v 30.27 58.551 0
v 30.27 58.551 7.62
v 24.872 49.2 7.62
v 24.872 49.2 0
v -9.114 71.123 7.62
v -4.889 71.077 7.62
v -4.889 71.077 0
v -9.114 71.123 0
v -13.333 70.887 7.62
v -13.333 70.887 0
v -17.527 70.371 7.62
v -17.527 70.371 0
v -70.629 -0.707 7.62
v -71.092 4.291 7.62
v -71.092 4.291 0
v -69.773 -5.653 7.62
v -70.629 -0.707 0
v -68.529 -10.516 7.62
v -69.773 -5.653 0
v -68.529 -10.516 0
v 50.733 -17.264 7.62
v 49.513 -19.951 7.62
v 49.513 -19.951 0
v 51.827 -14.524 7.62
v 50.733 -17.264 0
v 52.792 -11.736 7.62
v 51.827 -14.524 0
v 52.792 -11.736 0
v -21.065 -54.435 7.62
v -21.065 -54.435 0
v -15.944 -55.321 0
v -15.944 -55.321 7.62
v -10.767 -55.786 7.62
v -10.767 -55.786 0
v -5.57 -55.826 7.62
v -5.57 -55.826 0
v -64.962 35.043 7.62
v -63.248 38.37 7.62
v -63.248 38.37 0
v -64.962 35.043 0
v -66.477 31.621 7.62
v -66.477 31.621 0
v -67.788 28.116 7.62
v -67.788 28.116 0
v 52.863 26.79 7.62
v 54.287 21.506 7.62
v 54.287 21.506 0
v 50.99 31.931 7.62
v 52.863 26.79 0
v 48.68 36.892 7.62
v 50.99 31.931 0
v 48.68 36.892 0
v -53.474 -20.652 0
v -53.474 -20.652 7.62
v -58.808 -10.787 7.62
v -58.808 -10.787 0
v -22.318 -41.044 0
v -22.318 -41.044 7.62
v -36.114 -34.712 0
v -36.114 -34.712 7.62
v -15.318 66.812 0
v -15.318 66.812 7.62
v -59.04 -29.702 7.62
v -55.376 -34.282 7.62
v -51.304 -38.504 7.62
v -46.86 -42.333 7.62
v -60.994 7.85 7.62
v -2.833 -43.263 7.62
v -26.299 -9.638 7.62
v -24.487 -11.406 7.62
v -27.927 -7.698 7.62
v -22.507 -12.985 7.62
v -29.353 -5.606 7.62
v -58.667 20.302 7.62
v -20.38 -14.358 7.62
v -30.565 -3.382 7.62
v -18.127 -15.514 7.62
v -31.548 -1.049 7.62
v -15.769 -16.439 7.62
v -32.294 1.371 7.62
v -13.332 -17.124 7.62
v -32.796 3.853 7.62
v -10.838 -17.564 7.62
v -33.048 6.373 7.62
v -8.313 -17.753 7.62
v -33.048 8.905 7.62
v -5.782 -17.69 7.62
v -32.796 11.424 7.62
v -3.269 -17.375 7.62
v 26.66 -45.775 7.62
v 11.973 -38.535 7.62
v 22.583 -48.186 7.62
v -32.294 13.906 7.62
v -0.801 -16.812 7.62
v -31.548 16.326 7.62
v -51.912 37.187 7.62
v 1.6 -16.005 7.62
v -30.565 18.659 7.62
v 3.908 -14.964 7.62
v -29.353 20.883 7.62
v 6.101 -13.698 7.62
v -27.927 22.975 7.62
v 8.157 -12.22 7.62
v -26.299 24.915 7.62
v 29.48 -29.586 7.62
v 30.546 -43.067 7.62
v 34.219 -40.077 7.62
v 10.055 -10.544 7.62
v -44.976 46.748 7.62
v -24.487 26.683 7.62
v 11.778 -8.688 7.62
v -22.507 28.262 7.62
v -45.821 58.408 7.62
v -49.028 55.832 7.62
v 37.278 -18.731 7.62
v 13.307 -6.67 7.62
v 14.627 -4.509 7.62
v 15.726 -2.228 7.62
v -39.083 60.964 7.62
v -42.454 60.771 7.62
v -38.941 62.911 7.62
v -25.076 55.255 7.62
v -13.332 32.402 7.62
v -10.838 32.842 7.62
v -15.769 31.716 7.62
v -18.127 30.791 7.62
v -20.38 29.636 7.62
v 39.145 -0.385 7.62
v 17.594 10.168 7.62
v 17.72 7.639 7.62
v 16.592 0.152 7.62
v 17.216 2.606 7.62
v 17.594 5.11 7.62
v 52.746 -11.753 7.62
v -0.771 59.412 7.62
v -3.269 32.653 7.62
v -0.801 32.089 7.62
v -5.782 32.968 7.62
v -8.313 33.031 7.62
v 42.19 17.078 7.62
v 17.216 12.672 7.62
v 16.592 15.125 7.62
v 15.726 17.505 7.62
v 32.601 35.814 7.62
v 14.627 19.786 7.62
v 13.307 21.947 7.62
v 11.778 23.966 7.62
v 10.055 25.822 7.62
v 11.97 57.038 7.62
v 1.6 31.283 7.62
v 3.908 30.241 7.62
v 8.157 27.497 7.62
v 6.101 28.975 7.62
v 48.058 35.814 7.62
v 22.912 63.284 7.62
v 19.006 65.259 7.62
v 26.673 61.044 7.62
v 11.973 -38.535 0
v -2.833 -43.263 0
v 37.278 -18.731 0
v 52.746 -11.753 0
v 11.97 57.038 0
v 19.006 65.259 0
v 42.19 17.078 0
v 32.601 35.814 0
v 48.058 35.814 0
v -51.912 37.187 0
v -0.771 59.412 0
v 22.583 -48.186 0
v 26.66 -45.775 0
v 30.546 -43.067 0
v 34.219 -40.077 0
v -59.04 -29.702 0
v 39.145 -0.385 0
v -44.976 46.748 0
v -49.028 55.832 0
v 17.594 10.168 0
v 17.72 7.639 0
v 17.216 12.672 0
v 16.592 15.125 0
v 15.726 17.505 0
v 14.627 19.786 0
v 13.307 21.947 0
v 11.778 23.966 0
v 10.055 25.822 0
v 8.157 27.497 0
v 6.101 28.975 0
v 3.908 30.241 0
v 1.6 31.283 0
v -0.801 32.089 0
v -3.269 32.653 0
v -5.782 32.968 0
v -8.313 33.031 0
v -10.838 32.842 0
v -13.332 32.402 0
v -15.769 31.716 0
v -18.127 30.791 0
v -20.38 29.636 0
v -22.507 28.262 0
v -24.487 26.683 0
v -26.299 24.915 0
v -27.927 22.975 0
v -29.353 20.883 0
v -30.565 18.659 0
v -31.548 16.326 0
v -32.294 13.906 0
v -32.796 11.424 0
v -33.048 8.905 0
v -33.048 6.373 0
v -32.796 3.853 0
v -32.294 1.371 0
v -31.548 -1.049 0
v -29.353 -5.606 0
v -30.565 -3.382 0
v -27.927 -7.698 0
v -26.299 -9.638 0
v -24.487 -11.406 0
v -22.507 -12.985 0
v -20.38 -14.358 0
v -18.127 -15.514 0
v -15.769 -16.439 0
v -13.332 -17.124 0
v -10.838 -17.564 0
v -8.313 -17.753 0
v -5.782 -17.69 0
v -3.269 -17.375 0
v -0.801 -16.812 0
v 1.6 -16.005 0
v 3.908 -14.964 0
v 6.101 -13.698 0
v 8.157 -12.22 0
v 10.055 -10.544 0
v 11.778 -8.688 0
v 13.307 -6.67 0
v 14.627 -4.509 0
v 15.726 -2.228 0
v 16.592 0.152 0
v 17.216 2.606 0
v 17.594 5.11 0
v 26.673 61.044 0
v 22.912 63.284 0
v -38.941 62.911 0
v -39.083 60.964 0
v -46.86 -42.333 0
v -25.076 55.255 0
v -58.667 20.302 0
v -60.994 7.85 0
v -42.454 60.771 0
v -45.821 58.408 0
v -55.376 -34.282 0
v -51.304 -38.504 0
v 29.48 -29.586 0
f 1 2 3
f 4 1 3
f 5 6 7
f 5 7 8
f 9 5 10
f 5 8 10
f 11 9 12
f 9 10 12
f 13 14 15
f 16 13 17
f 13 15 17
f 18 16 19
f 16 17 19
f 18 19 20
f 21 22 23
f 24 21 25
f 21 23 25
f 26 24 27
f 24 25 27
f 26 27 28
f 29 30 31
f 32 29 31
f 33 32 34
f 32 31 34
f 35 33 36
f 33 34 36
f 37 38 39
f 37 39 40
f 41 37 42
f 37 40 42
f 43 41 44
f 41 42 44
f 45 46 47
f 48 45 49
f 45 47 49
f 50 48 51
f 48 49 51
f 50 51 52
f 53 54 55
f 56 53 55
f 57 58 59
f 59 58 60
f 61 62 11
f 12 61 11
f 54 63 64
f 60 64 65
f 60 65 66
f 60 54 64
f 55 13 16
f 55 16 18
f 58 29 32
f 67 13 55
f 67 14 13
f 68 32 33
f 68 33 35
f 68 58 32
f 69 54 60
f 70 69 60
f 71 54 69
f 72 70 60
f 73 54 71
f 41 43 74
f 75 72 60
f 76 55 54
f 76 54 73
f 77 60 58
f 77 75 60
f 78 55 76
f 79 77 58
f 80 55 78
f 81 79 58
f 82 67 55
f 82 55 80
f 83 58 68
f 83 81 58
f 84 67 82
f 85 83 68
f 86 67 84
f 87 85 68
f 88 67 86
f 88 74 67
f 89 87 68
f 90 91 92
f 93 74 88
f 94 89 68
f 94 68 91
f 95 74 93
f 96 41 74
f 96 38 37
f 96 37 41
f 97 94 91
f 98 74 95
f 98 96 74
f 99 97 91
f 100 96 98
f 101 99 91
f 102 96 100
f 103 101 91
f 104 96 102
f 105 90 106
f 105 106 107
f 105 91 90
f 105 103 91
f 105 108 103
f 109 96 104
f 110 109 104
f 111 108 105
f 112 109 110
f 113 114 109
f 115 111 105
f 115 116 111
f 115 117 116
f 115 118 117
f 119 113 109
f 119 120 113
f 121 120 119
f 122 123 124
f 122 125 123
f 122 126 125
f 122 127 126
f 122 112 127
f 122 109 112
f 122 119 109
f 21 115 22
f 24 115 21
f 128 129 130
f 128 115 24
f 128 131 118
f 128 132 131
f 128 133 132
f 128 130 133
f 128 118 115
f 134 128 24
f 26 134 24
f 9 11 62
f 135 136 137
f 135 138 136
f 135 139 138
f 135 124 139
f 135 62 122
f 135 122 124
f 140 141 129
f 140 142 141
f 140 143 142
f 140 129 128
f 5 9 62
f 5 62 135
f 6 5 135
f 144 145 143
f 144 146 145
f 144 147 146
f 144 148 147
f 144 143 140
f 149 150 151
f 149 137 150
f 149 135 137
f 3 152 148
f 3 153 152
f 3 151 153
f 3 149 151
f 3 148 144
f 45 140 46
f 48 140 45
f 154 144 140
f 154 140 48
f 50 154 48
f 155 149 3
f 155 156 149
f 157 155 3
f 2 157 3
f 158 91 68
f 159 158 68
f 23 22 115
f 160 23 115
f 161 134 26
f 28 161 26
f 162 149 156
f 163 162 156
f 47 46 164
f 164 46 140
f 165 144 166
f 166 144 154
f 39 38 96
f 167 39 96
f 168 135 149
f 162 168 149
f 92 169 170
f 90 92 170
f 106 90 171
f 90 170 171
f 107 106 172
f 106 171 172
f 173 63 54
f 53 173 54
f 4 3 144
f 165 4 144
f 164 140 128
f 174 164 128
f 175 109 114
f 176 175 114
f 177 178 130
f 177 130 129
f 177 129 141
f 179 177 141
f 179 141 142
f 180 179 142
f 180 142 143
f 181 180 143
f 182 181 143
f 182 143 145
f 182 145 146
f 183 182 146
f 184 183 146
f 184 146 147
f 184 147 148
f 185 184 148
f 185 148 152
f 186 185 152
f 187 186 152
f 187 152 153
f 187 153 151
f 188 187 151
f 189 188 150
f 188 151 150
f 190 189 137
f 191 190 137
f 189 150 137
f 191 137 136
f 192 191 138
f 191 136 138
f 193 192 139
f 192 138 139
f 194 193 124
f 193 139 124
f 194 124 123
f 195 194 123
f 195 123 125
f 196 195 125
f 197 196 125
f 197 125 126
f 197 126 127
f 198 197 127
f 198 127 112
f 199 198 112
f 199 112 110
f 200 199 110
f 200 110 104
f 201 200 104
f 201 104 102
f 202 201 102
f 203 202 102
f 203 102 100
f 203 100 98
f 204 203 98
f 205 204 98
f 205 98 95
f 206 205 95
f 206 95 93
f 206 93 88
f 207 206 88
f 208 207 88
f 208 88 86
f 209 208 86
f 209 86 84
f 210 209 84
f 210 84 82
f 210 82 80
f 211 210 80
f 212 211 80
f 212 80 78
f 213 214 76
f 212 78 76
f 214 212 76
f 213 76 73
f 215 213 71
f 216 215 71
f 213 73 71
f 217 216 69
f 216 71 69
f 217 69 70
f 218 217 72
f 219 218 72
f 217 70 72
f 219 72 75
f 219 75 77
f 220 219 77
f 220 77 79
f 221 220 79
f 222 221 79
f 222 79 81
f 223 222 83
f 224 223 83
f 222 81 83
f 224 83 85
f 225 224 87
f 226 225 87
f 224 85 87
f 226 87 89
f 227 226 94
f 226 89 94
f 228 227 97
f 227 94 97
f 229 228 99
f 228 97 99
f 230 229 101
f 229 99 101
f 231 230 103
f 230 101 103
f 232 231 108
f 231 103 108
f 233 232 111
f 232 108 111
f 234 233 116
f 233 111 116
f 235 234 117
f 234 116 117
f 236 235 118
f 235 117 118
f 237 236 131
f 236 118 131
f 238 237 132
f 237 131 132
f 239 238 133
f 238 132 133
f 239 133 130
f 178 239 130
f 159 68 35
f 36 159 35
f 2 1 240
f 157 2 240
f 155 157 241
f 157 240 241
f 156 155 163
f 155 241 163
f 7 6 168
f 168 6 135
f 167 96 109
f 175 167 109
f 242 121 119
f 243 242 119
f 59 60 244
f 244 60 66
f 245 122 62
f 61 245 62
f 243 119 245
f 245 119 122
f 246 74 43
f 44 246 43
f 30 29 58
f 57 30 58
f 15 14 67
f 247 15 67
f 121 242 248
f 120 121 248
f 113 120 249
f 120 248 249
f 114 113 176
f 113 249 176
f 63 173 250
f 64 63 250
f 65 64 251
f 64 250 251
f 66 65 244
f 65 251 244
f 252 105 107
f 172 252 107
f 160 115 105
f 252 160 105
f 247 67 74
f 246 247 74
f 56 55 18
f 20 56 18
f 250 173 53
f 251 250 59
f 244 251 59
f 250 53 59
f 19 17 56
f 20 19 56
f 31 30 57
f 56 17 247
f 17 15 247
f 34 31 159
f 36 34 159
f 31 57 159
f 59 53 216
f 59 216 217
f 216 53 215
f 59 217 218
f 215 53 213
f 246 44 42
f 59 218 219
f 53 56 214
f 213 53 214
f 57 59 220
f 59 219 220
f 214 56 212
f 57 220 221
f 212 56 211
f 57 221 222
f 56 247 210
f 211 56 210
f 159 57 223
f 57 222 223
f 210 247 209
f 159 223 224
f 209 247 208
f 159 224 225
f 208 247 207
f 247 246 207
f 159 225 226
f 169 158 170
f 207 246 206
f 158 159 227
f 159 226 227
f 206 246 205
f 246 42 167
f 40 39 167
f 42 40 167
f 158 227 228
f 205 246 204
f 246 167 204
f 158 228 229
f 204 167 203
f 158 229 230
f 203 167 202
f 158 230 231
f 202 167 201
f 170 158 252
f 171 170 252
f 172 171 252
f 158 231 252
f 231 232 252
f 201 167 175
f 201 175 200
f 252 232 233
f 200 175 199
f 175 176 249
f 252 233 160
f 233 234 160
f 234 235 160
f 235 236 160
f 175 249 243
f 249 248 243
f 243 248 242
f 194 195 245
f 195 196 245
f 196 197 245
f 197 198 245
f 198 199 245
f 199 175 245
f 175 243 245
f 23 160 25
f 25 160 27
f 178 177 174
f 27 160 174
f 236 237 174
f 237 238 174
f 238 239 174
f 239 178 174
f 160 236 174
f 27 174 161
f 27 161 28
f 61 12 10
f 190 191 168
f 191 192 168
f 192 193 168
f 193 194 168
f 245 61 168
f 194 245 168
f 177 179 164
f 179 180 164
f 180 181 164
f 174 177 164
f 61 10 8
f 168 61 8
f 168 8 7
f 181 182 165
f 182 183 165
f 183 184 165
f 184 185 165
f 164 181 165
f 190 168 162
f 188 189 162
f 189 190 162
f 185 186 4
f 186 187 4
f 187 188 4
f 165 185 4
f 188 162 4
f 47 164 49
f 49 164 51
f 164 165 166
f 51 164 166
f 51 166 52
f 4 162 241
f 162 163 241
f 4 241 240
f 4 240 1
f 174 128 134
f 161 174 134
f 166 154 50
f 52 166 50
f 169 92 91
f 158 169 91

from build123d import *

# Parameters (mm, degrees)
F0_R     = 63.5
F1_DEPTH = 7.62
F2_R     = 25.4
F3_DEPTH = 10.16
F5_DEPTH = 25.4


with BuildPart() as f1:
    # F0 (on Top) → F1 (new body)
    with BuildSketch(Plane.XY):
        with Locations((-7.679907, 7.63871)):
            Circle(F0_R)
    extrude(amount=F1_DEPTH)

    # F2 (on face) → F3 (cut)
    with BuildSketch(Plane.XY.offset(7.62)):
        with Locations((-7.679907, 7.63871)):
            Circle(F2_R)
    extrude(amount=-F3_DEPTH, mode=Mode.SUBTRACT)

    # F4 (on face) → F5 (cut)
    with BuildSketch(Plane.XY.offset(7.62)):
        Polygon((-70.018905, -10.474761), (-75.894549, -20.027222), (-70.559698, -29.89191), (-59.349201, -30.204137), (-53.473556, -20.651676), (-58.808408, -10.786988), align=None)
        Polygon((-72.942136, 3.63904), (-60.994428, 7.849691), (-58.667104, 20.302035), (-68.287489, 28.543728), (-80.235197, 24.333077), (-82.562521, 11.880733), align=None)
        Polygon((-63.660068, 38.412835), (-51.911708, 37.186518), (-44.975507, 46.747738), (-49.787665, 57.535274), (-61.536025, 58.761591), (-68.472226, 49.200372), align=None)
        Polygon((-23.294299, 79.663551), (-37.981644, 76.049112), (-39.082748, 60.963693), (-25.075922, 55.254831), (-15.318124, 66.811979), align=None)
        Polygon((-47.082333, -58.607126), (-33.286273, -64.939879), (-20.903919, -56.158517), (-22.317623, -41.044403), (-36.113683, -34.71165), (-48.496038, -43.493011), align=None)
        Polygon((5.356202, -68.9087), (20.162689, -64.180396), (23.471101, -48.993451), (11.973027, -38.53481), (-2.83346, -43.263113), (-6.141872, -58.450058), align=None)
        Polygon((34.981984, -41.765964), (48.281185, -43.091442), (56.078684, -32.236736), (50.576981, -20.056551), (37.27778, -18.731073), (29.480282, -29.585779), align=None)
        Polygon((52.745689, -11.753145), (69.391161, -5.659039), (72.436247, 11.803416), (58.83586, 23.171765), (42.190388, 17.077659), (39.145302, -0.384796), align=None)
        Polygon((48.057828, 35.814065), (55.786416, 49.200372), (48.057828, 62.586678), (32.600653, 62.586678), (24.872065, 49.200372), (32.600653, 35.814065), align=None)
        Polygon((20.397003, 66.884476), (16.08287, 79.105869), (3.341766, 81.480417), (-5.085204, 71.633571), (-0.771071, 59.412177), (11.970033, 57.03763), align=None)
    extrude(amount=-F5_DEPTH, mode=Mode.SUBTRACT)


solid = f1.part
